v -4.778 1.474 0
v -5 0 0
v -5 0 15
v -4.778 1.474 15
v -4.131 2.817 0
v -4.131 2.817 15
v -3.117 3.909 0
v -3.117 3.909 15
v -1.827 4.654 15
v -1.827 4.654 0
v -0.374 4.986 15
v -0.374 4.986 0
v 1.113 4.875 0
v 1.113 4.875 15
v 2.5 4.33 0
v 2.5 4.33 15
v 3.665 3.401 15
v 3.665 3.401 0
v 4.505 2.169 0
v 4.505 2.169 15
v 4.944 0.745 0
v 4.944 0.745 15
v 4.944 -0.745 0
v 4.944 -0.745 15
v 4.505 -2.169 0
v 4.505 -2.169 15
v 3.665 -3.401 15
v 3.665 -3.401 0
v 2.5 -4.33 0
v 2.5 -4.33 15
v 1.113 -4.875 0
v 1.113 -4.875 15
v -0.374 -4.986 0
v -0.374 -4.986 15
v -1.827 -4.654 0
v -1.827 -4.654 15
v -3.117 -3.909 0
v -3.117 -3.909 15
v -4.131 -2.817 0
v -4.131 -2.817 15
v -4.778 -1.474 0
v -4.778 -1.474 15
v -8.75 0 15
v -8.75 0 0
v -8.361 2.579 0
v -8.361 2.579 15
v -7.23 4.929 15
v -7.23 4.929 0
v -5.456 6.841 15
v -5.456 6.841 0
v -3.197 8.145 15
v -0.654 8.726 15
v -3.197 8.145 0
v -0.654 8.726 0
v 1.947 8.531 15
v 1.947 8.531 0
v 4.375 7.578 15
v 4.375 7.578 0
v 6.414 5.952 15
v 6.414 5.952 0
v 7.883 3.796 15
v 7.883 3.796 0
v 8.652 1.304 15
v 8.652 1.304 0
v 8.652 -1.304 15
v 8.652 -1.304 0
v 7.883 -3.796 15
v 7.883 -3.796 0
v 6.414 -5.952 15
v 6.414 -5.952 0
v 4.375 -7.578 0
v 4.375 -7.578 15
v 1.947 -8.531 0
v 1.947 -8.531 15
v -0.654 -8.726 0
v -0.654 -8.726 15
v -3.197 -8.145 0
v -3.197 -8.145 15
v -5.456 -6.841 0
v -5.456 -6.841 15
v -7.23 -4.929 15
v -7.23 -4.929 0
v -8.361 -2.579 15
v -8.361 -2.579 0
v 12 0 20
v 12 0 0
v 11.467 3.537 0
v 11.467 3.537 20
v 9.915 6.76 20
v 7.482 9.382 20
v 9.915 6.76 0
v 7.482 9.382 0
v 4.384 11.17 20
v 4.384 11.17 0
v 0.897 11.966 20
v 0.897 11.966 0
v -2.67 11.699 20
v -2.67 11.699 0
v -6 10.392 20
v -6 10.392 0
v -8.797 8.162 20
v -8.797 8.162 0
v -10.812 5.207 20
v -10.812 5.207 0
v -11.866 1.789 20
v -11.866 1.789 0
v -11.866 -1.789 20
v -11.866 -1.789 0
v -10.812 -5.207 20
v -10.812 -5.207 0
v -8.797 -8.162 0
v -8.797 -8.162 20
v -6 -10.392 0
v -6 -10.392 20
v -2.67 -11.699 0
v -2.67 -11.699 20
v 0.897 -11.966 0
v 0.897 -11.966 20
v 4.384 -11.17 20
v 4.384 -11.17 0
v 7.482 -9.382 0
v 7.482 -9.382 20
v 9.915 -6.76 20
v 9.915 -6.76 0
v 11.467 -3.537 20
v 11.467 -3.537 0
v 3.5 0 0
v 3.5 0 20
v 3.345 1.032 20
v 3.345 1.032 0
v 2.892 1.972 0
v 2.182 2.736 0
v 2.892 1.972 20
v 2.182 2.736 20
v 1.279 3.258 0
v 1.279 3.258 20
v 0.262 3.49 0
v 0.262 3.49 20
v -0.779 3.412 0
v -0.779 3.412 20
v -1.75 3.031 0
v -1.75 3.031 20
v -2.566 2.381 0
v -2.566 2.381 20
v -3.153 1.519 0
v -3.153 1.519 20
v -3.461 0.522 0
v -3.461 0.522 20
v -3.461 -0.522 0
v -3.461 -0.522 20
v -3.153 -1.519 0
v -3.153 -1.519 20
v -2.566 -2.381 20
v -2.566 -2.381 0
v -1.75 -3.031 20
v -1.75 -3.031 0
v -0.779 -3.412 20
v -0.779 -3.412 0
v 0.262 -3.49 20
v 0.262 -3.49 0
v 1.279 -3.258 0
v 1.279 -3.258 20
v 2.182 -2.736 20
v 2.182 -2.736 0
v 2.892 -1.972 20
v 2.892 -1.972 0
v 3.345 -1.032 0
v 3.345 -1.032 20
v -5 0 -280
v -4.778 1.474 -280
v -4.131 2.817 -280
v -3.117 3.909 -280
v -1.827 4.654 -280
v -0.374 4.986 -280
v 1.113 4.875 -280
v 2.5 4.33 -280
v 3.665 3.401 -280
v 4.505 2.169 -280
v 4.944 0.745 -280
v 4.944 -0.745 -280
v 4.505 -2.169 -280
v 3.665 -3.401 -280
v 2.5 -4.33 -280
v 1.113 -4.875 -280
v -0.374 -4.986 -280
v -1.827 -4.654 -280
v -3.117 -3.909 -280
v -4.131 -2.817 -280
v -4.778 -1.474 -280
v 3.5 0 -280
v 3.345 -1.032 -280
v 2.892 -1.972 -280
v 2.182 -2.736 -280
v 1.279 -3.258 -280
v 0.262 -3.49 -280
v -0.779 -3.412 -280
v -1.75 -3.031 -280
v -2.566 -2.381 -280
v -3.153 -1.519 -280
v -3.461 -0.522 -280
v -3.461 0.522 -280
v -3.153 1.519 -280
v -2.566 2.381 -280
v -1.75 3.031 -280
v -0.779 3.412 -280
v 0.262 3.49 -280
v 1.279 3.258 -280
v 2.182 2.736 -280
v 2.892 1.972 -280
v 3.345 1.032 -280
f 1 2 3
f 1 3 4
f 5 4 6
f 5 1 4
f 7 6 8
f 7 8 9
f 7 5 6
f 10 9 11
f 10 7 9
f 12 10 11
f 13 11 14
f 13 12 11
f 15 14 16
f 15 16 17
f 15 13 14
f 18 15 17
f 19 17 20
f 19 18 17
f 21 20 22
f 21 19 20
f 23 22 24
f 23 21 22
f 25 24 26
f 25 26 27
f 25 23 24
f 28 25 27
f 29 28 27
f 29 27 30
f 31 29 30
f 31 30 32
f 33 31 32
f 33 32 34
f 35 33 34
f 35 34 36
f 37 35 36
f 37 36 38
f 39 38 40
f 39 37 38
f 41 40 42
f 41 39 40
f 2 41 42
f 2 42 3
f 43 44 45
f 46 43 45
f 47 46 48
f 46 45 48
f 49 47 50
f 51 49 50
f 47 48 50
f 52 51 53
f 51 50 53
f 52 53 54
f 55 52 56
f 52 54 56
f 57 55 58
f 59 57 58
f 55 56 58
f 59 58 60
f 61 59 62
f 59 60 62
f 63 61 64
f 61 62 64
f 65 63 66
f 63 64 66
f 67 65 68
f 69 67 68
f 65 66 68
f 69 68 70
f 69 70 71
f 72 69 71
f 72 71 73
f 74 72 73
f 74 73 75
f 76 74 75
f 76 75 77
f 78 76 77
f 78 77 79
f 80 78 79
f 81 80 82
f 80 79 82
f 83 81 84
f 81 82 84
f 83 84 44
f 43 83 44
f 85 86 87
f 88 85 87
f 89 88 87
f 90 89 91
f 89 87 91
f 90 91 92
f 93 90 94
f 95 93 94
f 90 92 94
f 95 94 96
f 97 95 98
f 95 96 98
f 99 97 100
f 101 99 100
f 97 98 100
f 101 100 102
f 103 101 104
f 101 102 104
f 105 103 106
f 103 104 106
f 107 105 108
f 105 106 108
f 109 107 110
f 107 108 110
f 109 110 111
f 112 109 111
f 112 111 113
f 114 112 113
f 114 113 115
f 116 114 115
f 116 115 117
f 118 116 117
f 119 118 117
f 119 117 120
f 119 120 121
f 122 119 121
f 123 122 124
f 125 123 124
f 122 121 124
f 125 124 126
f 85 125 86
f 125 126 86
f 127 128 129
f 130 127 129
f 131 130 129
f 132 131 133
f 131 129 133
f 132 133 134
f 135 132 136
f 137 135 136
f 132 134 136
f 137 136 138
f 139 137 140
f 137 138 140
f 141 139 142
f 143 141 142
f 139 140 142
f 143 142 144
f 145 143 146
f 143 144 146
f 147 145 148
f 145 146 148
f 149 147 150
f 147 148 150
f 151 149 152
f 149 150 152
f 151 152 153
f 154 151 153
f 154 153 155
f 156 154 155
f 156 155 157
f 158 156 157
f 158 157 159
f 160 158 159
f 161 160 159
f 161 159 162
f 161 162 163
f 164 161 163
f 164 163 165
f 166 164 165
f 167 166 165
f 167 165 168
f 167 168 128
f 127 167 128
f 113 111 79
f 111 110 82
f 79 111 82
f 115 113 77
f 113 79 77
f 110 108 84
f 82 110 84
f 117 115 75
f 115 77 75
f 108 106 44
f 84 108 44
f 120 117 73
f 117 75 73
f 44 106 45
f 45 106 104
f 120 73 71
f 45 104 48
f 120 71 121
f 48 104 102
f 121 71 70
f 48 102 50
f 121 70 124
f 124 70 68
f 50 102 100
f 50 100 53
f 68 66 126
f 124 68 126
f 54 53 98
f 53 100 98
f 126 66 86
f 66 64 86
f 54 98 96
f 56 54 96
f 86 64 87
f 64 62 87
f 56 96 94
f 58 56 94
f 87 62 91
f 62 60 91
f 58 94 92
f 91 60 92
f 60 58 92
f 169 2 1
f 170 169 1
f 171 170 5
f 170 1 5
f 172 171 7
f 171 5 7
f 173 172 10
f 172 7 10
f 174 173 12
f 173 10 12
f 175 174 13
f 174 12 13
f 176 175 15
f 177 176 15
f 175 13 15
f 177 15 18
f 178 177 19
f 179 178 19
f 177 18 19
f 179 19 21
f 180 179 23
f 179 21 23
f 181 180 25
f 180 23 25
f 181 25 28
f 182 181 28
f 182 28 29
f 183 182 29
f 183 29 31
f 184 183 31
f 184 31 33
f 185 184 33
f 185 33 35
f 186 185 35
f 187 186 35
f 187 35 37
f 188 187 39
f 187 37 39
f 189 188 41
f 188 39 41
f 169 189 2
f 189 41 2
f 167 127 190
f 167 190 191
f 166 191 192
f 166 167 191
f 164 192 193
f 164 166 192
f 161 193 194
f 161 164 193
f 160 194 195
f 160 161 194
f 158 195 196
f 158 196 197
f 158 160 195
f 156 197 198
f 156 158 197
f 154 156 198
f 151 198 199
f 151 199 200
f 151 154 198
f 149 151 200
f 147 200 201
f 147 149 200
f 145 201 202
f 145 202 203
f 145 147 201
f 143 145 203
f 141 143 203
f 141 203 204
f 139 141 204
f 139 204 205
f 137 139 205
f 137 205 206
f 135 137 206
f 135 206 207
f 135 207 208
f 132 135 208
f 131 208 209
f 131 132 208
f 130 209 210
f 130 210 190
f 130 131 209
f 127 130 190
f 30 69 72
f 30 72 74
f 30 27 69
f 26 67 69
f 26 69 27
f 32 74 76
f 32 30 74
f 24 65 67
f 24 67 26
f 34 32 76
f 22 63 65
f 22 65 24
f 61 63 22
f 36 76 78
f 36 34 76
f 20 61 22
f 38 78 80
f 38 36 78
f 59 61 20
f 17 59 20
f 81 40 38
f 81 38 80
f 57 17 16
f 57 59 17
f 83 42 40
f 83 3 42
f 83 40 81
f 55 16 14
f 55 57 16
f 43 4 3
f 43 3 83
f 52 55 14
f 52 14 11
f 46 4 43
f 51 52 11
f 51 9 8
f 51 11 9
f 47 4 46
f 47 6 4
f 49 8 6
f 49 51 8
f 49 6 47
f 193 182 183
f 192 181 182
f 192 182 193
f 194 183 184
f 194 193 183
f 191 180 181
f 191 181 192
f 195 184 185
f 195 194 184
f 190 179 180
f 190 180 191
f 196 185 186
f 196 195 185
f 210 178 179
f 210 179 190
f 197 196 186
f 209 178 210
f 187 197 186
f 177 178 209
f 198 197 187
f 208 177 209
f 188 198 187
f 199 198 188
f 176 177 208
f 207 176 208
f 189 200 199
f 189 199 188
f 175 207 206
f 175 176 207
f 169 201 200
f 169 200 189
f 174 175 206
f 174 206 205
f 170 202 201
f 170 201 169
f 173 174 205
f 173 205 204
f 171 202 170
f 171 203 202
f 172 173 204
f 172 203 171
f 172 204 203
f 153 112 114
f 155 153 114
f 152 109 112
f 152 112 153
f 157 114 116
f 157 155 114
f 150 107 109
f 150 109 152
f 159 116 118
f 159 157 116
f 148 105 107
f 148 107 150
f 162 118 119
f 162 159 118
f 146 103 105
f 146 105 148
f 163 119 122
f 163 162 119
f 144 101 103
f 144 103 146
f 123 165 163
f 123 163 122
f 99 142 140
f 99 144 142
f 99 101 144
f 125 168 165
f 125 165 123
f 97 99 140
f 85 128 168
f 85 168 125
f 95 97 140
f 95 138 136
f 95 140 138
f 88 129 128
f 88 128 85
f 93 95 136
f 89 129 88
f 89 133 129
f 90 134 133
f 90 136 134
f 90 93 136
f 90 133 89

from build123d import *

# Parameters (mm, degrees)
SKETCH1_R           = 12
BOSS_EXTRUDE1_DEPTH = 20
SKETCH2_R           = 8.75
SKETCH2_R_2         = 5
CUT_EXTRUDE1_DEPTH  = 15
SKETCH3_R           = 3.5
CUT_EXTRUDE2_DEPTH  = 27.229754097
SKETCH4_R           = 5
SKETCH4_R_2         = 3.5
BOSS_EXTRUDE2_DEPTH = 280


with BuildPart() as part:
    # Sketch1 → Boss-Extrude1 (new body)
    with BuildSketch(Plane.XY):
        Circle(SKETCH1_R)
    extrude(amount=BOSS_EXTRUDE1_DEPTH)

    # Sketch2 → Cut-Extrude1 (cut)
    with BuildSketch(Plane(origin=(0, 0, 0), x_dir=(-1, 0, 0), z_dir=(0, 0, -1))):
        Circle(SKETCH2_R)
        Circle(SKETCH2_R_2, mode=Mode.SUBTRACT)
    extrude(amount=-CUT_EXTRUDE1_DEPTH, mode=Mode.SUBTRACT)

    # Sketch3 → Cut-Extrude2 (cut, through all)
    with BuildSketch(Plane.XY.offset(20)):
        Circle(SKETCH3_R)
    extrude(amount=-CUT_EXTRUDE2_DEPTH, mode=Mode.SUBTRACT)

    # Sketch4 → Boss-Extrude2 (add)
    with BuildSketch(Plane(origin=(0, 0, 0), x_dir=(-1, 0, 0), z_dir=(0, 0, -1))):
        Circle(SKETCH4_R)
        with Locations(Location((0, 0, 0), (0, 0, 180))):
            Circle(SKETCH4_R_2, mode=Mode.SUBTRACT)
    extrude(amount=BOSS_EXTRUDE2_DEPTH)


solid = part.part
